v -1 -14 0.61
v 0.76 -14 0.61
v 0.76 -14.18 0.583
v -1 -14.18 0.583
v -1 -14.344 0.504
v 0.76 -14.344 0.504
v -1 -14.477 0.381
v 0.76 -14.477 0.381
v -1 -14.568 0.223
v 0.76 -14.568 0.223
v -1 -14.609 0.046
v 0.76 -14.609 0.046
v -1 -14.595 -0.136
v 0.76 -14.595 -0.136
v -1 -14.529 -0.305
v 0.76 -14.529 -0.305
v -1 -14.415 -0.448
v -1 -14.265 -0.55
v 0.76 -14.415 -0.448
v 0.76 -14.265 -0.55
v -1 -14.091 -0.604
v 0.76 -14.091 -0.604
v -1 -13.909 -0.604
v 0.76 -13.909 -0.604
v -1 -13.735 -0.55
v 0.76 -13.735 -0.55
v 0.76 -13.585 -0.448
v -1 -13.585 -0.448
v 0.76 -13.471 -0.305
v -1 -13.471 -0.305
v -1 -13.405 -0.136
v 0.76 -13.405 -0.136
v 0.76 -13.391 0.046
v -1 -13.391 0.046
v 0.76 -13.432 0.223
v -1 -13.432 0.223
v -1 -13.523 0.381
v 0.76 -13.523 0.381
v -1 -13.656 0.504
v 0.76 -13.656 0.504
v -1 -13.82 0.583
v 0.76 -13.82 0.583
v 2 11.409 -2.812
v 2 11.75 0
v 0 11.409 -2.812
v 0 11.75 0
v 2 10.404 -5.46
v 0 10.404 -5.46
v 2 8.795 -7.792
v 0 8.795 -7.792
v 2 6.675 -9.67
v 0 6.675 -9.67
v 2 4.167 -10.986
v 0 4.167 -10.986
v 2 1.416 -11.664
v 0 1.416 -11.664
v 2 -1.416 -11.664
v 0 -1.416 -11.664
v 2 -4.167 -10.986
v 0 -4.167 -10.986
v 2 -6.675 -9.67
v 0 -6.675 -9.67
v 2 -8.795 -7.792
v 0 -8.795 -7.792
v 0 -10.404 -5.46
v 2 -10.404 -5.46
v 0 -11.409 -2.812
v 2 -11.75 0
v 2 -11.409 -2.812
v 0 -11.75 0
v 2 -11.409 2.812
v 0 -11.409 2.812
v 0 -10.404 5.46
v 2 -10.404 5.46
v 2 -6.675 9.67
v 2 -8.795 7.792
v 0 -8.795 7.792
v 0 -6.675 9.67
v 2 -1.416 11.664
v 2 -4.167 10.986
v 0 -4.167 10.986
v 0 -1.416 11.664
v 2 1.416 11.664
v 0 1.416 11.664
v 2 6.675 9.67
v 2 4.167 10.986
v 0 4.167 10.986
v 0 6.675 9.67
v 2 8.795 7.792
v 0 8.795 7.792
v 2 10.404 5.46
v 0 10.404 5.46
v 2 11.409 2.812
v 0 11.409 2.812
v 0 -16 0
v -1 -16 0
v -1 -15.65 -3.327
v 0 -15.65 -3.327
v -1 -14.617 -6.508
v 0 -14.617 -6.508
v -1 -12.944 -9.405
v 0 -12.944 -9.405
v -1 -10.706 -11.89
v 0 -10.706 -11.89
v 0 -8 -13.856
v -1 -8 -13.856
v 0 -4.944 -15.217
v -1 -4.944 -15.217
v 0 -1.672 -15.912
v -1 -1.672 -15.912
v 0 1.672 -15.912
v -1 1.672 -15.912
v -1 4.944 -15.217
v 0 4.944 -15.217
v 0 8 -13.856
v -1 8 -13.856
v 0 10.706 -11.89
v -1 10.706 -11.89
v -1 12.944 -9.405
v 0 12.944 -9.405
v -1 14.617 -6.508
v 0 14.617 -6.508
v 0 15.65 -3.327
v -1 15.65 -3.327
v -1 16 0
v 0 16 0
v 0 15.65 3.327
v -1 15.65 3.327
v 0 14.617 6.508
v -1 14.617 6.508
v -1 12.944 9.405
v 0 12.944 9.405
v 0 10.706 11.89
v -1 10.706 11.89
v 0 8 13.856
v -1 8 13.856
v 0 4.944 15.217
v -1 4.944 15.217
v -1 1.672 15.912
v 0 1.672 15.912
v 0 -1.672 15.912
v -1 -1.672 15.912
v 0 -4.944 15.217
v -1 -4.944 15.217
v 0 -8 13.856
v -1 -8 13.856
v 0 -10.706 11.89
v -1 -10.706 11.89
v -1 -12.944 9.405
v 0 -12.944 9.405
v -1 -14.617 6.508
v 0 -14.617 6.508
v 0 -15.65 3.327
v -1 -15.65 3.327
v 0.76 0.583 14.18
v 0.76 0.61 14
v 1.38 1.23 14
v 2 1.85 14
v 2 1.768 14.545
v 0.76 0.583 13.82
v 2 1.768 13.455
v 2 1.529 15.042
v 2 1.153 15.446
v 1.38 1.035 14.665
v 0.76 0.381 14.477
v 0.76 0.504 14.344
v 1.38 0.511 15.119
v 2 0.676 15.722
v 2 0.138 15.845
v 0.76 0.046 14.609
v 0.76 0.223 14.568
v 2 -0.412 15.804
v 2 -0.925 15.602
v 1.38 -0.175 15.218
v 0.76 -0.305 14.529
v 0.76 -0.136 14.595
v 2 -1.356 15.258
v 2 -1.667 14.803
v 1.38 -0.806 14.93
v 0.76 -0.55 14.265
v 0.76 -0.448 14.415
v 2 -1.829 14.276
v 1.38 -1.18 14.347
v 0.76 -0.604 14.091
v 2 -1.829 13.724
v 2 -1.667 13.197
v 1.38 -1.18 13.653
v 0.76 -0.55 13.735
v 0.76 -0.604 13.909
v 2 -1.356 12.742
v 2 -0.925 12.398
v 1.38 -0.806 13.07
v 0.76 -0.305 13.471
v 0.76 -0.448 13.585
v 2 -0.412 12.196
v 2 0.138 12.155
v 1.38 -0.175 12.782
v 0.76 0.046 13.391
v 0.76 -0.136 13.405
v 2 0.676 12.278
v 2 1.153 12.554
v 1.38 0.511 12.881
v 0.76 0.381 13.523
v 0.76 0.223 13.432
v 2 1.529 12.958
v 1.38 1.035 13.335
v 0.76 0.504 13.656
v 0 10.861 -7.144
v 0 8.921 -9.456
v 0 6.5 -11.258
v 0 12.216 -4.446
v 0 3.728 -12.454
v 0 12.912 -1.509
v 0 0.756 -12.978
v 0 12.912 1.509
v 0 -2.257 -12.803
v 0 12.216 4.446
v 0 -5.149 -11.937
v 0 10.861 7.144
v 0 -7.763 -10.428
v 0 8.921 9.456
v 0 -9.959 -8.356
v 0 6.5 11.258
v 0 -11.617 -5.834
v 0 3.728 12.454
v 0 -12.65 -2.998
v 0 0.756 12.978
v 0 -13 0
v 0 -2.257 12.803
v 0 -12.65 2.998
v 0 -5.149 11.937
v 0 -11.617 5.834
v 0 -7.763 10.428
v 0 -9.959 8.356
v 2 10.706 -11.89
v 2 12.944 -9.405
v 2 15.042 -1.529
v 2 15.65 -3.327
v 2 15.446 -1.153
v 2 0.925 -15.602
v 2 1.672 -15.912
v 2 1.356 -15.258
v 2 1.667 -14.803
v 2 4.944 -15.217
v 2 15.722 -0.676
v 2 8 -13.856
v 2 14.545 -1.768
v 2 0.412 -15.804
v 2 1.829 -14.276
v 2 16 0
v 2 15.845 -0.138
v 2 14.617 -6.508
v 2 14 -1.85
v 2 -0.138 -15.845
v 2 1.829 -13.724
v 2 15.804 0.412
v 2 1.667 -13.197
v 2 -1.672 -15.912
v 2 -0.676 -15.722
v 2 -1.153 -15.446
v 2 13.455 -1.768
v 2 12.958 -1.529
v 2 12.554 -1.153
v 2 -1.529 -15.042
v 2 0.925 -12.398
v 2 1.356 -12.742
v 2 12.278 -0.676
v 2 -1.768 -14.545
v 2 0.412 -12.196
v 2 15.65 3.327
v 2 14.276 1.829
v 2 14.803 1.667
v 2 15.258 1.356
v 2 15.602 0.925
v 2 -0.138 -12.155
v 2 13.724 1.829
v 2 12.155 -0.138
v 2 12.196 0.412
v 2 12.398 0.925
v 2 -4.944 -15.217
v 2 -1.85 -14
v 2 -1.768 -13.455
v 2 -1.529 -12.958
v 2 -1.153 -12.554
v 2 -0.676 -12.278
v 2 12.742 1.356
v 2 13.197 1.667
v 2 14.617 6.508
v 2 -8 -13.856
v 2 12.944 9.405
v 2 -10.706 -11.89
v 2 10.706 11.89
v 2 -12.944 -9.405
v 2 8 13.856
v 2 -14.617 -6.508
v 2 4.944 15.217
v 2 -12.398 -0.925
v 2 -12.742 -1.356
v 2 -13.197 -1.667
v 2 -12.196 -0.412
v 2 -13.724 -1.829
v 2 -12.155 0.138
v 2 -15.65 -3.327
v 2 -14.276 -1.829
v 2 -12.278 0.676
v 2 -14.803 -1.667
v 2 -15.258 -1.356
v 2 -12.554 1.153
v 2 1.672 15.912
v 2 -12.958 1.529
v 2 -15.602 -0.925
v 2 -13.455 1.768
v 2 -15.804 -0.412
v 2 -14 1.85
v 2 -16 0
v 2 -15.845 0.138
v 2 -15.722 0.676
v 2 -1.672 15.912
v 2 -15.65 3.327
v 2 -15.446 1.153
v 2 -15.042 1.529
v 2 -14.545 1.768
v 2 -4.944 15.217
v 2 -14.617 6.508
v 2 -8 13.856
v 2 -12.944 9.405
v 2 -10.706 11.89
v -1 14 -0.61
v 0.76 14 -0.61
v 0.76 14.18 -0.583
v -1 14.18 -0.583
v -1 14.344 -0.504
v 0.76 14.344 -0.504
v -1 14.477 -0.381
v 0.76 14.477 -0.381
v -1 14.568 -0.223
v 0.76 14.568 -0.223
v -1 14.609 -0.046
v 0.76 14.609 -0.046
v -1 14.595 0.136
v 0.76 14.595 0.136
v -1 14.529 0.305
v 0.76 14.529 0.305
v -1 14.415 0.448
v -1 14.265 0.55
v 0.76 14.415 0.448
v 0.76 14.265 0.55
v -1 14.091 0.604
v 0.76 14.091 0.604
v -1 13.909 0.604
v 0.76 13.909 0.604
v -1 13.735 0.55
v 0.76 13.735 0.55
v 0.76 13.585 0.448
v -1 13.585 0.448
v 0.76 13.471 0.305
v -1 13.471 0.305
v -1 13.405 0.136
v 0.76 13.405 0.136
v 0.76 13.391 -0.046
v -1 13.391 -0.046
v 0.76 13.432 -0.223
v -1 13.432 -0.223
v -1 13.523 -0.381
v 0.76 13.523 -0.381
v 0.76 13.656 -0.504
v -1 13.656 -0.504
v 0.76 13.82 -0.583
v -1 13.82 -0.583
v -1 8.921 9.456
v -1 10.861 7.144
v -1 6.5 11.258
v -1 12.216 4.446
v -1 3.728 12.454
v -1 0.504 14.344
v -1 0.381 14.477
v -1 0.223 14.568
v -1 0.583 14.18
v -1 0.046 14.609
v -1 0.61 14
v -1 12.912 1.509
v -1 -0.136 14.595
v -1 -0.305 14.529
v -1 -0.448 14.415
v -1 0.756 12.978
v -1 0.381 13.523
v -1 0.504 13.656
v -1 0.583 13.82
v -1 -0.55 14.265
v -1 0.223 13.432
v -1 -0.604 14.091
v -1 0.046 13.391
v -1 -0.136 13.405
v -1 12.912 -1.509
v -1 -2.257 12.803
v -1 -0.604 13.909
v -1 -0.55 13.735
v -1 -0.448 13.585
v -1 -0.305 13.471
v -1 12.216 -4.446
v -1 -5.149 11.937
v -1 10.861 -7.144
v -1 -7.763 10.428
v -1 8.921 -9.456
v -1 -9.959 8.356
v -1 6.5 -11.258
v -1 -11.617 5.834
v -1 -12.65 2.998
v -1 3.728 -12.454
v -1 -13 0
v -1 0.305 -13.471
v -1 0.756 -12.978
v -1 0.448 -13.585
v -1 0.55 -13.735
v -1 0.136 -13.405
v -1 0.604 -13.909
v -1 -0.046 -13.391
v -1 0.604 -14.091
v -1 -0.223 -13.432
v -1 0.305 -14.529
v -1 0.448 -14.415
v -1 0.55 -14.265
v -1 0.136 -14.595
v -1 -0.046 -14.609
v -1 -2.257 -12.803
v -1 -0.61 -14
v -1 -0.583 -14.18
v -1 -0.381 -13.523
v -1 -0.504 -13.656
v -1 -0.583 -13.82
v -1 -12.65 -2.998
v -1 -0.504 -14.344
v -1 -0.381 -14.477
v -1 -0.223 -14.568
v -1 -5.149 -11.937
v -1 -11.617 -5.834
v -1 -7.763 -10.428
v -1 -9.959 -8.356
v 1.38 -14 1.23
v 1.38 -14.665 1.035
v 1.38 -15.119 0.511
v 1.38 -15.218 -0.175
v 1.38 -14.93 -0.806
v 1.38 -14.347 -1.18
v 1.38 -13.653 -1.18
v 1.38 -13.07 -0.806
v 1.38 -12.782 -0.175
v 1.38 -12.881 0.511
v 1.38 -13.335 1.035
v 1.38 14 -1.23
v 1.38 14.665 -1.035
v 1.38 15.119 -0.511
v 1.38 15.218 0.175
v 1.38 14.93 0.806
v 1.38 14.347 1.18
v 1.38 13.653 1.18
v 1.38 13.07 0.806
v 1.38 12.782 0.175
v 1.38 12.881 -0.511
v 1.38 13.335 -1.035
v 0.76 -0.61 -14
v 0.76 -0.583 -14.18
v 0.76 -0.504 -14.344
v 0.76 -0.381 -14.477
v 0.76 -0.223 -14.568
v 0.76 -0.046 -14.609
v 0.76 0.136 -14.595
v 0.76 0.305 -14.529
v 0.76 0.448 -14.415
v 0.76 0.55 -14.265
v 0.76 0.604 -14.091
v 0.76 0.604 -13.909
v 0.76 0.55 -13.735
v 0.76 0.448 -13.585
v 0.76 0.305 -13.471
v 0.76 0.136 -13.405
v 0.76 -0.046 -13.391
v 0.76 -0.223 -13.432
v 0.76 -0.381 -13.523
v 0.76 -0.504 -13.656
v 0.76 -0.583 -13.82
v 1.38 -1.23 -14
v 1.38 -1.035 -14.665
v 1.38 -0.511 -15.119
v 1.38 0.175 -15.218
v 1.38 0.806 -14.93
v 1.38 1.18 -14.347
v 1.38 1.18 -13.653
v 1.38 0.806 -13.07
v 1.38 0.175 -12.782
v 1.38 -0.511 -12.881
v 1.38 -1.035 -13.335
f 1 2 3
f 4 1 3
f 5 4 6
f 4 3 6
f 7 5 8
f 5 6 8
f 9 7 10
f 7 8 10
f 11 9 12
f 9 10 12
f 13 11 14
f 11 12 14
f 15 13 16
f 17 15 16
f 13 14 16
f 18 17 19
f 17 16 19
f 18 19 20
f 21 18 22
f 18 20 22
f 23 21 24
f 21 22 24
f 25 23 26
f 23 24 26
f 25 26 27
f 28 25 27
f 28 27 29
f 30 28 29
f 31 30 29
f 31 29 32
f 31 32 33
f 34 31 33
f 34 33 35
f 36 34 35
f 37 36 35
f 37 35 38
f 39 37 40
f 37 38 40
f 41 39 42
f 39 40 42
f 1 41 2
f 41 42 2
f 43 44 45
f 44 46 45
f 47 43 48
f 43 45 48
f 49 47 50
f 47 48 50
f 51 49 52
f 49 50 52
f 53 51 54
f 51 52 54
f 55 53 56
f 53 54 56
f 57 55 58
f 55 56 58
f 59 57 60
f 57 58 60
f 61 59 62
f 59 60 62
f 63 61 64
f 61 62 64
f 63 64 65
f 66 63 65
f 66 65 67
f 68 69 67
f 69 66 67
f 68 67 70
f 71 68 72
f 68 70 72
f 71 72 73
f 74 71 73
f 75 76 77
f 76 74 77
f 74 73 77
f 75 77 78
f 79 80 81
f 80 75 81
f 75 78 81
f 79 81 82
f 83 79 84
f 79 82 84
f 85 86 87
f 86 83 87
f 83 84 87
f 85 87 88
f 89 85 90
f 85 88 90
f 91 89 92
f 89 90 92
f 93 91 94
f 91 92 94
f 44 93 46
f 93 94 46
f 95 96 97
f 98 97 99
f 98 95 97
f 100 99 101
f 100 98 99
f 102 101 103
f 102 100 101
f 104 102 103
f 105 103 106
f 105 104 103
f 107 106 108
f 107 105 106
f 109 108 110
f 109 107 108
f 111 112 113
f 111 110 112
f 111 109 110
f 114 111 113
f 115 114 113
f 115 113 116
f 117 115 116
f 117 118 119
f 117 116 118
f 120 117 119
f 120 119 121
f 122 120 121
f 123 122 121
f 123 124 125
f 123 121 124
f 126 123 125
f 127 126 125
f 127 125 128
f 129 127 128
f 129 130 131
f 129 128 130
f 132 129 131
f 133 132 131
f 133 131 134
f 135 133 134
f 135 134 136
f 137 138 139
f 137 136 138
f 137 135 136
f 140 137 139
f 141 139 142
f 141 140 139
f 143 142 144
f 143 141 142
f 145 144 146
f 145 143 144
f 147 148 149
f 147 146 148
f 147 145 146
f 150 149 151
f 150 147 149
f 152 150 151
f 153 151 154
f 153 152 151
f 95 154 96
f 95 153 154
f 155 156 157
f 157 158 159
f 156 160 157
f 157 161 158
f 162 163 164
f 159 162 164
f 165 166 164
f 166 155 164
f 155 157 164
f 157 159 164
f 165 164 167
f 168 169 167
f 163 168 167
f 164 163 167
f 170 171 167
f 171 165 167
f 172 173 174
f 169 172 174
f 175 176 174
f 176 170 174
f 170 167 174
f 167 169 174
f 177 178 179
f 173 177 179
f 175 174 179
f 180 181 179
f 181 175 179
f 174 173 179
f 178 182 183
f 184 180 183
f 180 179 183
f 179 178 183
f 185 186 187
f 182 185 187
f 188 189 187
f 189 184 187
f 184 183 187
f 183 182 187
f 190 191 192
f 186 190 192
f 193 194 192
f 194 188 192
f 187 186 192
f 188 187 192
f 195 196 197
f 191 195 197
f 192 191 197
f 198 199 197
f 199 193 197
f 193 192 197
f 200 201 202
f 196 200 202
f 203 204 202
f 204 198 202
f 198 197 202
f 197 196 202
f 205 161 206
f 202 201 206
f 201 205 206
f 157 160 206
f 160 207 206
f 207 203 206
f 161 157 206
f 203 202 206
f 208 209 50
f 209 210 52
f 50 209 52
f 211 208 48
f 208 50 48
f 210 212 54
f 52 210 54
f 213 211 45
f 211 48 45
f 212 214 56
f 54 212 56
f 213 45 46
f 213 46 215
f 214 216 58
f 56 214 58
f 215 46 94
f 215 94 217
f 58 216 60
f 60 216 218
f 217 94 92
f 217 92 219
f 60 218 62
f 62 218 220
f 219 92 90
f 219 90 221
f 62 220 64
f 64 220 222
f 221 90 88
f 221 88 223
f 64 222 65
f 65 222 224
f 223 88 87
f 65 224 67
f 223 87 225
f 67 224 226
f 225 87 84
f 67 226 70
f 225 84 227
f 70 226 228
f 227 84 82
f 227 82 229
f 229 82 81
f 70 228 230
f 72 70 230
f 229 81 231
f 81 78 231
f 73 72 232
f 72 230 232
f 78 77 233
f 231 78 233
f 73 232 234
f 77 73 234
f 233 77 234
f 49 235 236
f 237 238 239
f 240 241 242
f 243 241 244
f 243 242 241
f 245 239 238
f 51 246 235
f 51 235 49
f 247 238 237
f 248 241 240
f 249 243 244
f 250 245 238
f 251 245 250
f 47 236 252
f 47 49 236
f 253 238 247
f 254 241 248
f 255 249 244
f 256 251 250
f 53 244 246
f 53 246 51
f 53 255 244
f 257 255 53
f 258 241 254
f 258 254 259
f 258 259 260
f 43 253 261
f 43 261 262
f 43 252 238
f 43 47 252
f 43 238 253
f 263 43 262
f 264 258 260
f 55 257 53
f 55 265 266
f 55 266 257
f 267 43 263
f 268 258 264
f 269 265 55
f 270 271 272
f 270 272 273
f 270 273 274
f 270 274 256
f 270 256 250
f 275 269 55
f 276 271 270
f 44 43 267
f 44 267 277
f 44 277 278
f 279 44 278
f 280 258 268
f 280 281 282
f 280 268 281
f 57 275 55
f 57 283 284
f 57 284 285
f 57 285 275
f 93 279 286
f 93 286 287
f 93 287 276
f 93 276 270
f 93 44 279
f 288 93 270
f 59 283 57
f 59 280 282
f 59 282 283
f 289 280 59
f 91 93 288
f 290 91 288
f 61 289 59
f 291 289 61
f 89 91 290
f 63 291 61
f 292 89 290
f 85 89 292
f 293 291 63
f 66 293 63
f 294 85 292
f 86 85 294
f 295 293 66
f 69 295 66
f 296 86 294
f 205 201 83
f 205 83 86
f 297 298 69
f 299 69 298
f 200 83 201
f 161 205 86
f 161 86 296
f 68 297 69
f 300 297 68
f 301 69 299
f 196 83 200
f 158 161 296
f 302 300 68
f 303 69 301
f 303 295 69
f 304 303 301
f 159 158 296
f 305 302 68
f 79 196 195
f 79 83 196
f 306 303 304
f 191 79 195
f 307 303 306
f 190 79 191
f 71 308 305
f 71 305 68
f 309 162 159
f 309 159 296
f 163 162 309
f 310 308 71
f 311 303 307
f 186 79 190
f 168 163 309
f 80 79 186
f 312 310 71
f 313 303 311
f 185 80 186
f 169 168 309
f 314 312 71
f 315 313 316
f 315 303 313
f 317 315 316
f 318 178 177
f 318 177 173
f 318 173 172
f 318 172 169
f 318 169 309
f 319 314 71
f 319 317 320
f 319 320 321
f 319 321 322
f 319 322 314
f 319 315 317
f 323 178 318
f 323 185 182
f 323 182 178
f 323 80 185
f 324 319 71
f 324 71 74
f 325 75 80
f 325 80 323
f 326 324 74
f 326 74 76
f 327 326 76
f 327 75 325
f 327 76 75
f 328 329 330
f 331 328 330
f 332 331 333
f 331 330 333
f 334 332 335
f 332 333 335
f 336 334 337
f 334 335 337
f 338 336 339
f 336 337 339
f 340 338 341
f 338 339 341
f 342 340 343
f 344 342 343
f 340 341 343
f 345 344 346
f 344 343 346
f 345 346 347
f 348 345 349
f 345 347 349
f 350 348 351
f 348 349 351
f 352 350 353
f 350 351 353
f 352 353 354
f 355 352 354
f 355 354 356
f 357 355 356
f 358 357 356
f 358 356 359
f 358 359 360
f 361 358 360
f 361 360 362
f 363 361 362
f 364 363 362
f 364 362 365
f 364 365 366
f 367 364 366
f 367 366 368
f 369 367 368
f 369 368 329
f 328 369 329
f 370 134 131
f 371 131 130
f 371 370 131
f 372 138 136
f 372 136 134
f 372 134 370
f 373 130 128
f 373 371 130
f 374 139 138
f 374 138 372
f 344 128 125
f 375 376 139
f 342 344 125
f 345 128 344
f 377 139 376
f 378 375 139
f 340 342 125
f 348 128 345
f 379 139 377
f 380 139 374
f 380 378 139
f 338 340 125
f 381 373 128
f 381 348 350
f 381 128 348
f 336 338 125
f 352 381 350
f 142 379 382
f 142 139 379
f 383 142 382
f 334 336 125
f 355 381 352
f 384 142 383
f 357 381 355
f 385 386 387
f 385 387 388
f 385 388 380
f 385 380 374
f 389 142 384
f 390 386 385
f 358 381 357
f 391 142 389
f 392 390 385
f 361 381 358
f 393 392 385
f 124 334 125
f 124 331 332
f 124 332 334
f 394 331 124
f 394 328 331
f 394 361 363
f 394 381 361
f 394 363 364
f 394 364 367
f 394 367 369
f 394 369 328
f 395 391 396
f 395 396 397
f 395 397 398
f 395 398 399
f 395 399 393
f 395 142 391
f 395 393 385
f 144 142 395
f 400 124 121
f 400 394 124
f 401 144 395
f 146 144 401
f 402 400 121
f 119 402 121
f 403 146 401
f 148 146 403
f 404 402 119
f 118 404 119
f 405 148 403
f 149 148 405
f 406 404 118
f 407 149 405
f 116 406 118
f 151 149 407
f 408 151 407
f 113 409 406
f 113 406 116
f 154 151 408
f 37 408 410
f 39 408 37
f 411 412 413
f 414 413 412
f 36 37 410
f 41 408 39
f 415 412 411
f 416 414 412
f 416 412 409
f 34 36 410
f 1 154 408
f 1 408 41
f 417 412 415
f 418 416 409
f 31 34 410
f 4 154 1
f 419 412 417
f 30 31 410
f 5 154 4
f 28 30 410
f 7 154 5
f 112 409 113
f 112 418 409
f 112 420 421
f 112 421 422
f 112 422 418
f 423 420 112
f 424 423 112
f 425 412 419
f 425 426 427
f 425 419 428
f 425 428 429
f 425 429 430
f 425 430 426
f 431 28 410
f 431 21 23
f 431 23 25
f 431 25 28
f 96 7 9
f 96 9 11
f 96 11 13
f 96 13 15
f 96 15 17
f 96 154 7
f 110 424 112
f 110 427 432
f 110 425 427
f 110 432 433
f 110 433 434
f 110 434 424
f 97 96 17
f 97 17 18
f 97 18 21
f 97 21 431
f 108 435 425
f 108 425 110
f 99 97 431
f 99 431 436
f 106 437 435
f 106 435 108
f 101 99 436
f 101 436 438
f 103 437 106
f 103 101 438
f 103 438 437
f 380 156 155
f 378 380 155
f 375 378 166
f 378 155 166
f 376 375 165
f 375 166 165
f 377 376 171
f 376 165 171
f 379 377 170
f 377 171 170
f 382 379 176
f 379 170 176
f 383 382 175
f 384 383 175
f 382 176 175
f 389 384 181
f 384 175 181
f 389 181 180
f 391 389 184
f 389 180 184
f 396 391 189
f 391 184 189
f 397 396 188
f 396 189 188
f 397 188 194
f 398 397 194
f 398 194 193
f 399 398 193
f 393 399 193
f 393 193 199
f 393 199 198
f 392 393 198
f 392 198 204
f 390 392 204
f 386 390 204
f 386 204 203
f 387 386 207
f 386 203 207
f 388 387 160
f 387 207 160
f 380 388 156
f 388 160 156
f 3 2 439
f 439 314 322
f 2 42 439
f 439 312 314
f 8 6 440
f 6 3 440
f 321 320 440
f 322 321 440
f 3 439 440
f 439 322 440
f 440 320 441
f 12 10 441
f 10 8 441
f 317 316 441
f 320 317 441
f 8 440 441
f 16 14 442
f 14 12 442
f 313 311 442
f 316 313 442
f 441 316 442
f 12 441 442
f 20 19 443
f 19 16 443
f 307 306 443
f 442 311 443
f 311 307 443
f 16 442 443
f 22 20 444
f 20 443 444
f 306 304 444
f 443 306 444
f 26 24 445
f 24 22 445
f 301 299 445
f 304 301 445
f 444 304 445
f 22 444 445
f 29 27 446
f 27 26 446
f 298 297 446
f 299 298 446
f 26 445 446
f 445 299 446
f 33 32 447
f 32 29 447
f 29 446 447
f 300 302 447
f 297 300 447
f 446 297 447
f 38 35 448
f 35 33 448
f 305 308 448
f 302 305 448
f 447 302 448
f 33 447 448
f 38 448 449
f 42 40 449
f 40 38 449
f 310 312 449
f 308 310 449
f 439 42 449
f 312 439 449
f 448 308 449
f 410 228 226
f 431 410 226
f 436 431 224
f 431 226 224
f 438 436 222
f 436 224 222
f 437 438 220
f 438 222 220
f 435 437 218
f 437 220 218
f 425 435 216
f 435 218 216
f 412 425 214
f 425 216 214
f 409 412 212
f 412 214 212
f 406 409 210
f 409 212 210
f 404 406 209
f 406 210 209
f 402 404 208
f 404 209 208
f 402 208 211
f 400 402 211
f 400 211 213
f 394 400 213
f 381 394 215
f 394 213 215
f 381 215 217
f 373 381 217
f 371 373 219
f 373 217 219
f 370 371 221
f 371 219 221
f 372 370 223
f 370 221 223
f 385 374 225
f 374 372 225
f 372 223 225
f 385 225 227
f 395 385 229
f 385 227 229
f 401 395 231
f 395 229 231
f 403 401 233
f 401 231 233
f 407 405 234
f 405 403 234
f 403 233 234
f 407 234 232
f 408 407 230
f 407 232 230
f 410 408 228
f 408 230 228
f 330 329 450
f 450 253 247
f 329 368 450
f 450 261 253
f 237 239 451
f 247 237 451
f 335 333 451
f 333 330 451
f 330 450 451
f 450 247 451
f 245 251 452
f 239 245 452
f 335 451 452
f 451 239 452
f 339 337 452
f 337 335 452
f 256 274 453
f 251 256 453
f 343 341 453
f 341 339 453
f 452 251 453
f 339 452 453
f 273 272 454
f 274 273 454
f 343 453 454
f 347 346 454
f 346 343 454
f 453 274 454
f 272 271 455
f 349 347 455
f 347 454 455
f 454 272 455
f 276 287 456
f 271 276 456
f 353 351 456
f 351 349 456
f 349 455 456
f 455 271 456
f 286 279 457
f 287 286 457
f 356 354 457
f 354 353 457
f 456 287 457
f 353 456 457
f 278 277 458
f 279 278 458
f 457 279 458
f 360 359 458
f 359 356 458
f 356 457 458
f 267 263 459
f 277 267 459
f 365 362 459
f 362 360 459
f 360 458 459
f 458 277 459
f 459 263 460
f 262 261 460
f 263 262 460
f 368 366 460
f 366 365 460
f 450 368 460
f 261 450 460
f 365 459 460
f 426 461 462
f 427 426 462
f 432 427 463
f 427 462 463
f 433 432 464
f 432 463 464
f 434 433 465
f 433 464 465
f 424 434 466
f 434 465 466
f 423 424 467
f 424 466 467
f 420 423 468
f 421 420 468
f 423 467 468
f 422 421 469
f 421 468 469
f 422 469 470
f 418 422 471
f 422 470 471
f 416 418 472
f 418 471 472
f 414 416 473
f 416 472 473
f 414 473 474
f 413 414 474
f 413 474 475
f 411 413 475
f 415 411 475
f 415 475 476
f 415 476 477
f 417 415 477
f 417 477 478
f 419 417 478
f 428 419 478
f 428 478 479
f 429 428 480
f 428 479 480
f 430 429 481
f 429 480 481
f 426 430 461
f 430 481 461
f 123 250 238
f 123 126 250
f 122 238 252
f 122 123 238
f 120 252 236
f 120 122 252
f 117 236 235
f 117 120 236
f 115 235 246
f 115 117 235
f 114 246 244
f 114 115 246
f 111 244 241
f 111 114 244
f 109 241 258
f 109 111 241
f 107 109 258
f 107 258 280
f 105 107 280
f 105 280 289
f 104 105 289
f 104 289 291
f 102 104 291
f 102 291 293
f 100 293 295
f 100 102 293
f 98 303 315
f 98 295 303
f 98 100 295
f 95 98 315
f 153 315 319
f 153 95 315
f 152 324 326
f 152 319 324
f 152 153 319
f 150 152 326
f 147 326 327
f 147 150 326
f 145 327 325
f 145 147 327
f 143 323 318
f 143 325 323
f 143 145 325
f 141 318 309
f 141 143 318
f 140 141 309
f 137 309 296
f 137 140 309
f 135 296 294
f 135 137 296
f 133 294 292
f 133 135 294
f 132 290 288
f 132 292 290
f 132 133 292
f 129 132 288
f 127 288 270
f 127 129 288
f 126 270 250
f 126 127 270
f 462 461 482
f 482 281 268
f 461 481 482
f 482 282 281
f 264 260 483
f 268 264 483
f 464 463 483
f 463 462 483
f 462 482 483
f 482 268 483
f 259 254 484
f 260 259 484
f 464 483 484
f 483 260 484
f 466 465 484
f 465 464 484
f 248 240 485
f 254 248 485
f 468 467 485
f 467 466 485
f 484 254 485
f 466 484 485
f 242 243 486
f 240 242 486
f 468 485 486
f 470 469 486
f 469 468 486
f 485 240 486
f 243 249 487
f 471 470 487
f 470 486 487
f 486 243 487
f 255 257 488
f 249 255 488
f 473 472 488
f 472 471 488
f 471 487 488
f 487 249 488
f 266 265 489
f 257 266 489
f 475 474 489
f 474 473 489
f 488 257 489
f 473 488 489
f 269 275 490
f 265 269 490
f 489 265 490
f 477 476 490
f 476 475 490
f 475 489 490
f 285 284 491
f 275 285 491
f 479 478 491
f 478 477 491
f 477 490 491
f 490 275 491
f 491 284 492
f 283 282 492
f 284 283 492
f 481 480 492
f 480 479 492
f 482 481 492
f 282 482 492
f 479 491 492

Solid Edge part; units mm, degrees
sketch "Sketch1" plane through (0, 0, 0) normal (1, 0, 0) x (0, 1, 0)
  circle A0 centre (0, 0) radius 16
  circle A1 centre (0, 0) radius 11.75
extrude "Protrusion1" add sketch "Sketch1" along normal blind 2
sketch "Sketch2" plane through (0, 0, 0) normal (-1, 0, 0) x (0, -1, 0)
  circle A0 centre (0, 0) radius 16
  circle A1 centre (0, 0) radius 13
extrude "Extrusionsausprägung_2" add sketch "Sketch2" along normal blind 1
hole "Bohrung_1" at (2, 14, 0) direction (-1, 0, 0) diameter 1.221 end up to next countersink diameter 3.7 countersink angle 90 thread major 1.6 thread length 2
pattern_circular "Pattern2" count 4 over 360 about axis through (2, 0, 0) along (1, 0, 0) of "Bohrung_1"
